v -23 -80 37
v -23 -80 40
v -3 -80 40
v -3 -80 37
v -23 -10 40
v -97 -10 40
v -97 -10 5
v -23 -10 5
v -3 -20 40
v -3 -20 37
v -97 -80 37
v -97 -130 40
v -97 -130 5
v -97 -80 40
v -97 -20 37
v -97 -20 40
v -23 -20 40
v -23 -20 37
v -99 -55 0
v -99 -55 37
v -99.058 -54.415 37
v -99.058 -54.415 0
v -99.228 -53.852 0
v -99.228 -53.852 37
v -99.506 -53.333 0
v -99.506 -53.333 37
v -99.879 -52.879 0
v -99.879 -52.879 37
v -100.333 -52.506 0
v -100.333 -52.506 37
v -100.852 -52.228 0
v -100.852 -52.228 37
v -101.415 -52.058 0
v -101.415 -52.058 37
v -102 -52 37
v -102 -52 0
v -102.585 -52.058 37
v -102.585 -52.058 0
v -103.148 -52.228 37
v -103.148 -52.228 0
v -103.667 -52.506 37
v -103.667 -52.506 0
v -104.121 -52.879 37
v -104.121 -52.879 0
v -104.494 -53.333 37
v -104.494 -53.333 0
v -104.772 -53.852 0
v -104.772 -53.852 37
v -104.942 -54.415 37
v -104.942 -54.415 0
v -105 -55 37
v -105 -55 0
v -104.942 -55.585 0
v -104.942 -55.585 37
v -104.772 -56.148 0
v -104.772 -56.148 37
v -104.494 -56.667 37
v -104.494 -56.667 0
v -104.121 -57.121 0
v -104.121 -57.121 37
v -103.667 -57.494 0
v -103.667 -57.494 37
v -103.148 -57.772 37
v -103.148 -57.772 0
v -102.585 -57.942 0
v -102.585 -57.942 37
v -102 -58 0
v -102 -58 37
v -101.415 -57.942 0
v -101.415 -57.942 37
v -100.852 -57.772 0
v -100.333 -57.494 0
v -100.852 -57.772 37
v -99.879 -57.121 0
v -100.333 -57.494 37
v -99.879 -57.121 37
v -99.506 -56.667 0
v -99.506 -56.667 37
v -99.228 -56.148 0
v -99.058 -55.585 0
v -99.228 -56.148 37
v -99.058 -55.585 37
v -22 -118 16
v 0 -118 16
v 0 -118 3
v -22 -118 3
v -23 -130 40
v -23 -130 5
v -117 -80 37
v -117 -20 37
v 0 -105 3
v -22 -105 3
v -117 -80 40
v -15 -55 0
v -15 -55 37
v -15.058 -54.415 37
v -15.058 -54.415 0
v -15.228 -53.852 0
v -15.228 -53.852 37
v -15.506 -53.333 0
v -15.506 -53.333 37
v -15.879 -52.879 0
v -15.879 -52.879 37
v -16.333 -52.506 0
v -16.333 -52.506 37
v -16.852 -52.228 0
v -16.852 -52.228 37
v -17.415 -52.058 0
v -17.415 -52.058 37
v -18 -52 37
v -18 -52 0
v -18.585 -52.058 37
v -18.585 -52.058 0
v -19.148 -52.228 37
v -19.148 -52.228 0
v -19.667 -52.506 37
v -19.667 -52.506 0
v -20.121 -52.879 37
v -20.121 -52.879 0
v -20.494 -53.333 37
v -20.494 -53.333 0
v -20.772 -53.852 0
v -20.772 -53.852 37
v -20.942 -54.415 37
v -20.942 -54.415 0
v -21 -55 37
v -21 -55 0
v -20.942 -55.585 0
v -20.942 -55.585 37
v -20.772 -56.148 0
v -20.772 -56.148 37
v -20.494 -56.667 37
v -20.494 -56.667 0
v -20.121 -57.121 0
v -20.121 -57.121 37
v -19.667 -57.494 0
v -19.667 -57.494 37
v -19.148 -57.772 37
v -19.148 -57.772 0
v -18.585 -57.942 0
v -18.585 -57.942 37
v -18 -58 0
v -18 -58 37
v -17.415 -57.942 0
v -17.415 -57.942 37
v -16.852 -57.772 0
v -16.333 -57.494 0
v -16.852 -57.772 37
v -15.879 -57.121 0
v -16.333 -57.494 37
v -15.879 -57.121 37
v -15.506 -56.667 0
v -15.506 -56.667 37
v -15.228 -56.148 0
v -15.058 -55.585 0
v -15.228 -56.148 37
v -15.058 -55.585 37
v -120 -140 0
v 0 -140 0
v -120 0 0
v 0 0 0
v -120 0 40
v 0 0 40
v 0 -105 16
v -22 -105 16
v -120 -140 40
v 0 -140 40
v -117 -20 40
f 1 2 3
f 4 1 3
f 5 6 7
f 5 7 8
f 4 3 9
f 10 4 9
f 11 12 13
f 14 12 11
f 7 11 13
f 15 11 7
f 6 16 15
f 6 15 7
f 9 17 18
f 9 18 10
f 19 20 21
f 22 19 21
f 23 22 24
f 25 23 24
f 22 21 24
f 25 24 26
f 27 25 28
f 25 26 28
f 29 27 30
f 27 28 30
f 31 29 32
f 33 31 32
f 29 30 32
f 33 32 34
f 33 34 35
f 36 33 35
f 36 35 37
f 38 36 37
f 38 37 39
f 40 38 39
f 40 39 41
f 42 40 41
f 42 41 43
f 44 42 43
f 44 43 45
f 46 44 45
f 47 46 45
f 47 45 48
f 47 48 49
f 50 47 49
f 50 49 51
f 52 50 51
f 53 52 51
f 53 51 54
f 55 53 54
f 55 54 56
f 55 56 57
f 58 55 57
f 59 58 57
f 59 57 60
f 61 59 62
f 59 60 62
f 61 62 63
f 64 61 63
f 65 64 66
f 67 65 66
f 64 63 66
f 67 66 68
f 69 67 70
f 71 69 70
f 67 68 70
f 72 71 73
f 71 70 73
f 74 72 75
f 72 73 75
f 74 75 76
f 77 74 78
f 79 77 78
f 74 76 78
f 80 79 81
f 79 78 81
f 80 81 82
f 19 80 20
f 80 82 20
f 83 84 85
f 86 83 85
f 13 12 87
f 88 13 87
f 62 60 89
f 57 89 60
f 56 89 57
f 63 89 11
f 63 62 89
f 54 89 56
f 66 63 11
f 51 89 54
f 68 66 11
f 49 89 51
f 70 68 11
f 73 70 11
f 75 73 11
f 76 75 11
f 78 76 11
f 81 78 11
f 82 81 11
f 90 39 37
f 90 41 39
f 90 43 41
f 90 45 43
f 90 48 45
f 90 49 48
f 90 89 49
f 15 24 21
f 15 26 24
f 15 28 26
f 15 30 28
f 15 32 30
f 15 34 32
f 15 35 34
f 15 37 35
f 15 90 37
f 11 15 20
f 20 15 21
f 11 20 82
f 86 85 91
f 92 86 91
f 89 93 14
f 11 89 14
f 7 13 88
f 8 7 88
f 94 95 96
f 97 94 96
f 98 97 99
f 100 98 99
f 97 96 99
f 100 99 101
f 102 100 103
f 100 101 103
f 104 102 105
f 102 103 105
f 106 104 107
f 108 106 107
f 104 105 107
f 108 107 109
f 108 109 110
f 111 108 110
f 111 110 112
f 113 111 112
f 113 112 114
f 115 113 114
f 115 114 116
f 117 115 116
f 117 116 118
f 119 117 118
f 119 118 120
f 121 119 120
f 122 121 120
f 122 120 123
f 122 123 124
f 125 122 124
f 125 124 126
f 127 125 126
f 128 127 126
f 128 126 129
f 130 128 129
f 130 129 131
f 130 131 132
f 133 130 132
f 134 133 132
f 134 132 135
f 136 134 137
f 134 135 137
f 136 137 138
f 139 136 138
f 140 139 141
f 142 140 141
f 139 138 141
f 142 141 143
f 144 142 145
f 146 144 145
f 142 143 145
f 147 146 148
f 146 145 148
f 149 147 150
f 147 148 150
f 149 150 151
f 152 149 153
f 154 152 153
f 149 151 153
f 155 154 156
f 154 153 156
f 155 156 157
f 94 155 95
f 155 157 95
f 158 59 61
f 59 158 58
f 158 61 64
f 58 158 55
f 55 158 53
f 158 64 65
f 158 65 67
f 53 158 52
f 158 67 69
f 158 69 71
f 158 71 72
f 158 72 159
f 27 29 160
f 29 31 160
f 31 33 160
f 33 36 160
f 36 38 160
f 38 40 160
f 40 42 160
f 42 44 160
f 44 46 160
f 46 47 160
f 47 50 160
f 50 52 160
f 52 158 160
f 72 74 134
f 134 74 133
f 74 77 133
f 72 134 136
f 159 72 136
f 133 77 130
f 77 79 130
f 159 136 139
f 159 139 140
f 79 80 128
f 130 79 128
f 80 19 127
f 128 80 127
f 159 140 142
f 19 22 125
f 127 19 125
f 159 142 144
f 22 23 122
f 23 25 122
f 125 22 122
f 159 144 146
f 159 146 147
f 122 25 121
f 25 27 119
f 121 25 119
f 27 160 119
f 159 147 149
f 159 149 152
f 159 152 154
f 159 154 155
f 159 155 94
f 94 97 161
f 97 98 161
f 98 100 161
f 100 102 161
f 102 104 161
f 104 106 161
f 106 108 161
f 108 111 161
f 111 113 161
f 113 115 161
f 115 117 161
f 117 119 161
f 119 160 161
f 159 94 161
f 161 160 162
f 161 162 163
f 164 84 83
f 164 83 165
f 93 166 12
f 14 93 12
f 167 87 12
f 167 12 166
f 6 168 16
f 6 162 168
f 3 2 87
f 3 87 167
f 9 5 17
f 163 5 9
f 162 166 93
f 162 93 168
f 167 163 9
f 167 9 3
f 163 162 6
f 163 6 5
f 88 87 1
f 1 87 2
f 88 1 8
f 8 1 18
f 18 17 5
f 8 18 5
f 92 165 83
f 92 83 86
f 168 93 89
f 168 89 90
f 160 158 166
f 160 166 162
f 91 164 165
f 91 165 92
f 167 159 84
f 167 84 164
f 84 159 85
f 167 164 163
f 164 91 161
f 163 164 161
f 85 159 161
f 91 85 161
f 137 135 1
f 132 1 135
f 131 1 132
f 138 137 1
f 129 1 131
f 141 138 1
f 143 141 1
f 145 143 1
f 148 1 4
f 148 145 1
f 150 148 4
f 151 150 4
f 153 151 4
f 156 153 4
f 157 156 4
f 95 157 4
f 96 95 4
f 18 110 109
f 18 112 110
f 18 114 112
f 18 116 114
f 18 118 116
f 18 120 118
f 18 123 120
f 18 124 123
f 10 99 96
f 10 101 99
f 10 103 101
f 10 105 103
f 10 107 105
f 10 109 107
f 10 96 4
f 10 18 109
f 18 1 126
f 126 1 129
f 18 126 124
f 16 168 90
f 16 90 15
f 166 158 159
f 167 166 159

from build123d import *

# Parameters (mm, degrees)
SKETCH2_W           = 120
SKETCH2_H           = 140
BOSS_EXTRUDE1_DEPTH = 40
SKETCH3_W           = 74
SKETCH3_H           = 120
CUT_EXTRUDE1_DEPTH  = 35
SKETCH4_R           = 3
CUT_EXTRUDE2_DEPTH  = 40
SKETCH5_W           = 13
SKETCH5_H           = 13
CUT_EXTRUDE3_DEPTH  = 22
SKETCH6_W           = 20
SKETCH6_H           = 60
CUT_EXTRUDE4_DEPTH  = 3


with BuildPart() as part:
    # Sketch2 → Boss-Extrude1 (new body)
    with BuildSketch(Plane.XY):
        with Locations((-60, -70)):
            Rectangle(SKETCH2_W, SKETCH2_H)
    extrude(amount=BOSS_EXTRUDE1_DEPTH)

    # Sketch3 → Cut-Extrude1 (cut)
    with BuildSketch(Plane.XY.offset(40)):
        with Locations((-60, -70)):
            Rectangle(SKETCH3_W, SKETCH3_H)
    extrude(amount=-CUT_EXTRUDE1_DEPTH, mode=Mode.SUBTRACT)

    # Sketch4 → Cut-Extrude2 (cut)
    with BuildSketch(Plane.XY.offset(40)):
        with Locations((-102, -55)):
            Circle(SKETCH4_R)
        with Locations((-18, -55)):
            Circle(SKETCH4_R)
    extrude(amount=-CUT_EXTRUDE2_DEPTH, mode=Mode.SUBTRACT)

    # Sketch5 → Cut-Extrude3 (cut)
    with BuildSketch(Plane(origin=(0, 0, 0), x_dir=(0, 0, -1), z_dir=(1, 0, 0))):
        with Locations((-9.5, -111.5)):
            Rectangle(SKETCH5_W, SKETCH5_H)
    extrude(amount=-CUT_EXTRUDE3_DEPTH, mode=Mode.SUBTRACT)

    # Sketch6 → Cut-Extrude4 (cut)
    with BuildSketch(Plane.XY.offset(40)):
        with Locations((-107, -50)):
            Rectangle(SKETCH6_W, SKETCH6_H)
        with Locations((-13, -50)):
            Rectangle(SKETCH6_W, SKETCH6_H)
    extrude(amount=-CUT_EXTRUDE4_DEPTH, mode=Mode.SUBTRACT)


solid = part.part
